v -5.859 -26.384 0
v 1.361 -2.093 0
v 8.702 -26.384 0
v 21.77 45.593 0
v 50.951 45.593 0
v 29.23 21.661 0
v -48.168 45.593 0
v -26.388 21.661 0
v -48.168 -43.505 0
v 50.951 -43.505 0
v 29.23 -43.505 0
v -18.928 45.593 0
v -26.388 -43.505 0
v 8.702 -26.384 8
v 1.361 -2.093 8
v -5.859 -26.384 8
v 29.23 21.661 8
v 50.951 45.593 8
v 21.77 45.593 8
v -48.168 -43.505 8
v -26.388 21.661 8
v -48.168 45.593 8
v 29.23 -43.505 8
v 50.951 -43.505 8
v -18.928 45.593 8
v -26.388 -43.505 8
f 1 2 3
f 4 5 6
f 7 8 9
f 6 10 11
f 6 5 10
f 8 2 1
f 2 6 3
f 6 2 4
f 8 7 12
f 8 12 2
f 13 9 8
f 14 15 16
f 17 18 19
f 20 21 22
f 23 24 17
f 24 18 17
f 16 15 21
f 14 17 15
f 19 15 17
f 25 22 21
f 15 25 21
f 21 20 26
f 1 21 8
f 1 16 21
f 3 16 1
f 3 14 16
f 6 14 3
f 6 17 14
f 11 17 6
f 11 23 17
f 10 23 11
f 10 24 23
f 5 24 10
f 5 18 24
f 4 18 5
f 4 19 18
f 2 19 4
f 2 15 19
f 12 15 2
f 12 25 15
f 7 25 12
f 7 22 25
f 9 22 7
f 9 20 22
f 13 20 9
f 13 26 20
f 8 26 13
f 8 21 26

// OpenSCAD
module glyph_2d() {
  text("M", size = 88, font = "Bahnschrift:style=Bold", halign = "center", valign = "center");
}
linear_extrude(height = 8) glyph_2d();
